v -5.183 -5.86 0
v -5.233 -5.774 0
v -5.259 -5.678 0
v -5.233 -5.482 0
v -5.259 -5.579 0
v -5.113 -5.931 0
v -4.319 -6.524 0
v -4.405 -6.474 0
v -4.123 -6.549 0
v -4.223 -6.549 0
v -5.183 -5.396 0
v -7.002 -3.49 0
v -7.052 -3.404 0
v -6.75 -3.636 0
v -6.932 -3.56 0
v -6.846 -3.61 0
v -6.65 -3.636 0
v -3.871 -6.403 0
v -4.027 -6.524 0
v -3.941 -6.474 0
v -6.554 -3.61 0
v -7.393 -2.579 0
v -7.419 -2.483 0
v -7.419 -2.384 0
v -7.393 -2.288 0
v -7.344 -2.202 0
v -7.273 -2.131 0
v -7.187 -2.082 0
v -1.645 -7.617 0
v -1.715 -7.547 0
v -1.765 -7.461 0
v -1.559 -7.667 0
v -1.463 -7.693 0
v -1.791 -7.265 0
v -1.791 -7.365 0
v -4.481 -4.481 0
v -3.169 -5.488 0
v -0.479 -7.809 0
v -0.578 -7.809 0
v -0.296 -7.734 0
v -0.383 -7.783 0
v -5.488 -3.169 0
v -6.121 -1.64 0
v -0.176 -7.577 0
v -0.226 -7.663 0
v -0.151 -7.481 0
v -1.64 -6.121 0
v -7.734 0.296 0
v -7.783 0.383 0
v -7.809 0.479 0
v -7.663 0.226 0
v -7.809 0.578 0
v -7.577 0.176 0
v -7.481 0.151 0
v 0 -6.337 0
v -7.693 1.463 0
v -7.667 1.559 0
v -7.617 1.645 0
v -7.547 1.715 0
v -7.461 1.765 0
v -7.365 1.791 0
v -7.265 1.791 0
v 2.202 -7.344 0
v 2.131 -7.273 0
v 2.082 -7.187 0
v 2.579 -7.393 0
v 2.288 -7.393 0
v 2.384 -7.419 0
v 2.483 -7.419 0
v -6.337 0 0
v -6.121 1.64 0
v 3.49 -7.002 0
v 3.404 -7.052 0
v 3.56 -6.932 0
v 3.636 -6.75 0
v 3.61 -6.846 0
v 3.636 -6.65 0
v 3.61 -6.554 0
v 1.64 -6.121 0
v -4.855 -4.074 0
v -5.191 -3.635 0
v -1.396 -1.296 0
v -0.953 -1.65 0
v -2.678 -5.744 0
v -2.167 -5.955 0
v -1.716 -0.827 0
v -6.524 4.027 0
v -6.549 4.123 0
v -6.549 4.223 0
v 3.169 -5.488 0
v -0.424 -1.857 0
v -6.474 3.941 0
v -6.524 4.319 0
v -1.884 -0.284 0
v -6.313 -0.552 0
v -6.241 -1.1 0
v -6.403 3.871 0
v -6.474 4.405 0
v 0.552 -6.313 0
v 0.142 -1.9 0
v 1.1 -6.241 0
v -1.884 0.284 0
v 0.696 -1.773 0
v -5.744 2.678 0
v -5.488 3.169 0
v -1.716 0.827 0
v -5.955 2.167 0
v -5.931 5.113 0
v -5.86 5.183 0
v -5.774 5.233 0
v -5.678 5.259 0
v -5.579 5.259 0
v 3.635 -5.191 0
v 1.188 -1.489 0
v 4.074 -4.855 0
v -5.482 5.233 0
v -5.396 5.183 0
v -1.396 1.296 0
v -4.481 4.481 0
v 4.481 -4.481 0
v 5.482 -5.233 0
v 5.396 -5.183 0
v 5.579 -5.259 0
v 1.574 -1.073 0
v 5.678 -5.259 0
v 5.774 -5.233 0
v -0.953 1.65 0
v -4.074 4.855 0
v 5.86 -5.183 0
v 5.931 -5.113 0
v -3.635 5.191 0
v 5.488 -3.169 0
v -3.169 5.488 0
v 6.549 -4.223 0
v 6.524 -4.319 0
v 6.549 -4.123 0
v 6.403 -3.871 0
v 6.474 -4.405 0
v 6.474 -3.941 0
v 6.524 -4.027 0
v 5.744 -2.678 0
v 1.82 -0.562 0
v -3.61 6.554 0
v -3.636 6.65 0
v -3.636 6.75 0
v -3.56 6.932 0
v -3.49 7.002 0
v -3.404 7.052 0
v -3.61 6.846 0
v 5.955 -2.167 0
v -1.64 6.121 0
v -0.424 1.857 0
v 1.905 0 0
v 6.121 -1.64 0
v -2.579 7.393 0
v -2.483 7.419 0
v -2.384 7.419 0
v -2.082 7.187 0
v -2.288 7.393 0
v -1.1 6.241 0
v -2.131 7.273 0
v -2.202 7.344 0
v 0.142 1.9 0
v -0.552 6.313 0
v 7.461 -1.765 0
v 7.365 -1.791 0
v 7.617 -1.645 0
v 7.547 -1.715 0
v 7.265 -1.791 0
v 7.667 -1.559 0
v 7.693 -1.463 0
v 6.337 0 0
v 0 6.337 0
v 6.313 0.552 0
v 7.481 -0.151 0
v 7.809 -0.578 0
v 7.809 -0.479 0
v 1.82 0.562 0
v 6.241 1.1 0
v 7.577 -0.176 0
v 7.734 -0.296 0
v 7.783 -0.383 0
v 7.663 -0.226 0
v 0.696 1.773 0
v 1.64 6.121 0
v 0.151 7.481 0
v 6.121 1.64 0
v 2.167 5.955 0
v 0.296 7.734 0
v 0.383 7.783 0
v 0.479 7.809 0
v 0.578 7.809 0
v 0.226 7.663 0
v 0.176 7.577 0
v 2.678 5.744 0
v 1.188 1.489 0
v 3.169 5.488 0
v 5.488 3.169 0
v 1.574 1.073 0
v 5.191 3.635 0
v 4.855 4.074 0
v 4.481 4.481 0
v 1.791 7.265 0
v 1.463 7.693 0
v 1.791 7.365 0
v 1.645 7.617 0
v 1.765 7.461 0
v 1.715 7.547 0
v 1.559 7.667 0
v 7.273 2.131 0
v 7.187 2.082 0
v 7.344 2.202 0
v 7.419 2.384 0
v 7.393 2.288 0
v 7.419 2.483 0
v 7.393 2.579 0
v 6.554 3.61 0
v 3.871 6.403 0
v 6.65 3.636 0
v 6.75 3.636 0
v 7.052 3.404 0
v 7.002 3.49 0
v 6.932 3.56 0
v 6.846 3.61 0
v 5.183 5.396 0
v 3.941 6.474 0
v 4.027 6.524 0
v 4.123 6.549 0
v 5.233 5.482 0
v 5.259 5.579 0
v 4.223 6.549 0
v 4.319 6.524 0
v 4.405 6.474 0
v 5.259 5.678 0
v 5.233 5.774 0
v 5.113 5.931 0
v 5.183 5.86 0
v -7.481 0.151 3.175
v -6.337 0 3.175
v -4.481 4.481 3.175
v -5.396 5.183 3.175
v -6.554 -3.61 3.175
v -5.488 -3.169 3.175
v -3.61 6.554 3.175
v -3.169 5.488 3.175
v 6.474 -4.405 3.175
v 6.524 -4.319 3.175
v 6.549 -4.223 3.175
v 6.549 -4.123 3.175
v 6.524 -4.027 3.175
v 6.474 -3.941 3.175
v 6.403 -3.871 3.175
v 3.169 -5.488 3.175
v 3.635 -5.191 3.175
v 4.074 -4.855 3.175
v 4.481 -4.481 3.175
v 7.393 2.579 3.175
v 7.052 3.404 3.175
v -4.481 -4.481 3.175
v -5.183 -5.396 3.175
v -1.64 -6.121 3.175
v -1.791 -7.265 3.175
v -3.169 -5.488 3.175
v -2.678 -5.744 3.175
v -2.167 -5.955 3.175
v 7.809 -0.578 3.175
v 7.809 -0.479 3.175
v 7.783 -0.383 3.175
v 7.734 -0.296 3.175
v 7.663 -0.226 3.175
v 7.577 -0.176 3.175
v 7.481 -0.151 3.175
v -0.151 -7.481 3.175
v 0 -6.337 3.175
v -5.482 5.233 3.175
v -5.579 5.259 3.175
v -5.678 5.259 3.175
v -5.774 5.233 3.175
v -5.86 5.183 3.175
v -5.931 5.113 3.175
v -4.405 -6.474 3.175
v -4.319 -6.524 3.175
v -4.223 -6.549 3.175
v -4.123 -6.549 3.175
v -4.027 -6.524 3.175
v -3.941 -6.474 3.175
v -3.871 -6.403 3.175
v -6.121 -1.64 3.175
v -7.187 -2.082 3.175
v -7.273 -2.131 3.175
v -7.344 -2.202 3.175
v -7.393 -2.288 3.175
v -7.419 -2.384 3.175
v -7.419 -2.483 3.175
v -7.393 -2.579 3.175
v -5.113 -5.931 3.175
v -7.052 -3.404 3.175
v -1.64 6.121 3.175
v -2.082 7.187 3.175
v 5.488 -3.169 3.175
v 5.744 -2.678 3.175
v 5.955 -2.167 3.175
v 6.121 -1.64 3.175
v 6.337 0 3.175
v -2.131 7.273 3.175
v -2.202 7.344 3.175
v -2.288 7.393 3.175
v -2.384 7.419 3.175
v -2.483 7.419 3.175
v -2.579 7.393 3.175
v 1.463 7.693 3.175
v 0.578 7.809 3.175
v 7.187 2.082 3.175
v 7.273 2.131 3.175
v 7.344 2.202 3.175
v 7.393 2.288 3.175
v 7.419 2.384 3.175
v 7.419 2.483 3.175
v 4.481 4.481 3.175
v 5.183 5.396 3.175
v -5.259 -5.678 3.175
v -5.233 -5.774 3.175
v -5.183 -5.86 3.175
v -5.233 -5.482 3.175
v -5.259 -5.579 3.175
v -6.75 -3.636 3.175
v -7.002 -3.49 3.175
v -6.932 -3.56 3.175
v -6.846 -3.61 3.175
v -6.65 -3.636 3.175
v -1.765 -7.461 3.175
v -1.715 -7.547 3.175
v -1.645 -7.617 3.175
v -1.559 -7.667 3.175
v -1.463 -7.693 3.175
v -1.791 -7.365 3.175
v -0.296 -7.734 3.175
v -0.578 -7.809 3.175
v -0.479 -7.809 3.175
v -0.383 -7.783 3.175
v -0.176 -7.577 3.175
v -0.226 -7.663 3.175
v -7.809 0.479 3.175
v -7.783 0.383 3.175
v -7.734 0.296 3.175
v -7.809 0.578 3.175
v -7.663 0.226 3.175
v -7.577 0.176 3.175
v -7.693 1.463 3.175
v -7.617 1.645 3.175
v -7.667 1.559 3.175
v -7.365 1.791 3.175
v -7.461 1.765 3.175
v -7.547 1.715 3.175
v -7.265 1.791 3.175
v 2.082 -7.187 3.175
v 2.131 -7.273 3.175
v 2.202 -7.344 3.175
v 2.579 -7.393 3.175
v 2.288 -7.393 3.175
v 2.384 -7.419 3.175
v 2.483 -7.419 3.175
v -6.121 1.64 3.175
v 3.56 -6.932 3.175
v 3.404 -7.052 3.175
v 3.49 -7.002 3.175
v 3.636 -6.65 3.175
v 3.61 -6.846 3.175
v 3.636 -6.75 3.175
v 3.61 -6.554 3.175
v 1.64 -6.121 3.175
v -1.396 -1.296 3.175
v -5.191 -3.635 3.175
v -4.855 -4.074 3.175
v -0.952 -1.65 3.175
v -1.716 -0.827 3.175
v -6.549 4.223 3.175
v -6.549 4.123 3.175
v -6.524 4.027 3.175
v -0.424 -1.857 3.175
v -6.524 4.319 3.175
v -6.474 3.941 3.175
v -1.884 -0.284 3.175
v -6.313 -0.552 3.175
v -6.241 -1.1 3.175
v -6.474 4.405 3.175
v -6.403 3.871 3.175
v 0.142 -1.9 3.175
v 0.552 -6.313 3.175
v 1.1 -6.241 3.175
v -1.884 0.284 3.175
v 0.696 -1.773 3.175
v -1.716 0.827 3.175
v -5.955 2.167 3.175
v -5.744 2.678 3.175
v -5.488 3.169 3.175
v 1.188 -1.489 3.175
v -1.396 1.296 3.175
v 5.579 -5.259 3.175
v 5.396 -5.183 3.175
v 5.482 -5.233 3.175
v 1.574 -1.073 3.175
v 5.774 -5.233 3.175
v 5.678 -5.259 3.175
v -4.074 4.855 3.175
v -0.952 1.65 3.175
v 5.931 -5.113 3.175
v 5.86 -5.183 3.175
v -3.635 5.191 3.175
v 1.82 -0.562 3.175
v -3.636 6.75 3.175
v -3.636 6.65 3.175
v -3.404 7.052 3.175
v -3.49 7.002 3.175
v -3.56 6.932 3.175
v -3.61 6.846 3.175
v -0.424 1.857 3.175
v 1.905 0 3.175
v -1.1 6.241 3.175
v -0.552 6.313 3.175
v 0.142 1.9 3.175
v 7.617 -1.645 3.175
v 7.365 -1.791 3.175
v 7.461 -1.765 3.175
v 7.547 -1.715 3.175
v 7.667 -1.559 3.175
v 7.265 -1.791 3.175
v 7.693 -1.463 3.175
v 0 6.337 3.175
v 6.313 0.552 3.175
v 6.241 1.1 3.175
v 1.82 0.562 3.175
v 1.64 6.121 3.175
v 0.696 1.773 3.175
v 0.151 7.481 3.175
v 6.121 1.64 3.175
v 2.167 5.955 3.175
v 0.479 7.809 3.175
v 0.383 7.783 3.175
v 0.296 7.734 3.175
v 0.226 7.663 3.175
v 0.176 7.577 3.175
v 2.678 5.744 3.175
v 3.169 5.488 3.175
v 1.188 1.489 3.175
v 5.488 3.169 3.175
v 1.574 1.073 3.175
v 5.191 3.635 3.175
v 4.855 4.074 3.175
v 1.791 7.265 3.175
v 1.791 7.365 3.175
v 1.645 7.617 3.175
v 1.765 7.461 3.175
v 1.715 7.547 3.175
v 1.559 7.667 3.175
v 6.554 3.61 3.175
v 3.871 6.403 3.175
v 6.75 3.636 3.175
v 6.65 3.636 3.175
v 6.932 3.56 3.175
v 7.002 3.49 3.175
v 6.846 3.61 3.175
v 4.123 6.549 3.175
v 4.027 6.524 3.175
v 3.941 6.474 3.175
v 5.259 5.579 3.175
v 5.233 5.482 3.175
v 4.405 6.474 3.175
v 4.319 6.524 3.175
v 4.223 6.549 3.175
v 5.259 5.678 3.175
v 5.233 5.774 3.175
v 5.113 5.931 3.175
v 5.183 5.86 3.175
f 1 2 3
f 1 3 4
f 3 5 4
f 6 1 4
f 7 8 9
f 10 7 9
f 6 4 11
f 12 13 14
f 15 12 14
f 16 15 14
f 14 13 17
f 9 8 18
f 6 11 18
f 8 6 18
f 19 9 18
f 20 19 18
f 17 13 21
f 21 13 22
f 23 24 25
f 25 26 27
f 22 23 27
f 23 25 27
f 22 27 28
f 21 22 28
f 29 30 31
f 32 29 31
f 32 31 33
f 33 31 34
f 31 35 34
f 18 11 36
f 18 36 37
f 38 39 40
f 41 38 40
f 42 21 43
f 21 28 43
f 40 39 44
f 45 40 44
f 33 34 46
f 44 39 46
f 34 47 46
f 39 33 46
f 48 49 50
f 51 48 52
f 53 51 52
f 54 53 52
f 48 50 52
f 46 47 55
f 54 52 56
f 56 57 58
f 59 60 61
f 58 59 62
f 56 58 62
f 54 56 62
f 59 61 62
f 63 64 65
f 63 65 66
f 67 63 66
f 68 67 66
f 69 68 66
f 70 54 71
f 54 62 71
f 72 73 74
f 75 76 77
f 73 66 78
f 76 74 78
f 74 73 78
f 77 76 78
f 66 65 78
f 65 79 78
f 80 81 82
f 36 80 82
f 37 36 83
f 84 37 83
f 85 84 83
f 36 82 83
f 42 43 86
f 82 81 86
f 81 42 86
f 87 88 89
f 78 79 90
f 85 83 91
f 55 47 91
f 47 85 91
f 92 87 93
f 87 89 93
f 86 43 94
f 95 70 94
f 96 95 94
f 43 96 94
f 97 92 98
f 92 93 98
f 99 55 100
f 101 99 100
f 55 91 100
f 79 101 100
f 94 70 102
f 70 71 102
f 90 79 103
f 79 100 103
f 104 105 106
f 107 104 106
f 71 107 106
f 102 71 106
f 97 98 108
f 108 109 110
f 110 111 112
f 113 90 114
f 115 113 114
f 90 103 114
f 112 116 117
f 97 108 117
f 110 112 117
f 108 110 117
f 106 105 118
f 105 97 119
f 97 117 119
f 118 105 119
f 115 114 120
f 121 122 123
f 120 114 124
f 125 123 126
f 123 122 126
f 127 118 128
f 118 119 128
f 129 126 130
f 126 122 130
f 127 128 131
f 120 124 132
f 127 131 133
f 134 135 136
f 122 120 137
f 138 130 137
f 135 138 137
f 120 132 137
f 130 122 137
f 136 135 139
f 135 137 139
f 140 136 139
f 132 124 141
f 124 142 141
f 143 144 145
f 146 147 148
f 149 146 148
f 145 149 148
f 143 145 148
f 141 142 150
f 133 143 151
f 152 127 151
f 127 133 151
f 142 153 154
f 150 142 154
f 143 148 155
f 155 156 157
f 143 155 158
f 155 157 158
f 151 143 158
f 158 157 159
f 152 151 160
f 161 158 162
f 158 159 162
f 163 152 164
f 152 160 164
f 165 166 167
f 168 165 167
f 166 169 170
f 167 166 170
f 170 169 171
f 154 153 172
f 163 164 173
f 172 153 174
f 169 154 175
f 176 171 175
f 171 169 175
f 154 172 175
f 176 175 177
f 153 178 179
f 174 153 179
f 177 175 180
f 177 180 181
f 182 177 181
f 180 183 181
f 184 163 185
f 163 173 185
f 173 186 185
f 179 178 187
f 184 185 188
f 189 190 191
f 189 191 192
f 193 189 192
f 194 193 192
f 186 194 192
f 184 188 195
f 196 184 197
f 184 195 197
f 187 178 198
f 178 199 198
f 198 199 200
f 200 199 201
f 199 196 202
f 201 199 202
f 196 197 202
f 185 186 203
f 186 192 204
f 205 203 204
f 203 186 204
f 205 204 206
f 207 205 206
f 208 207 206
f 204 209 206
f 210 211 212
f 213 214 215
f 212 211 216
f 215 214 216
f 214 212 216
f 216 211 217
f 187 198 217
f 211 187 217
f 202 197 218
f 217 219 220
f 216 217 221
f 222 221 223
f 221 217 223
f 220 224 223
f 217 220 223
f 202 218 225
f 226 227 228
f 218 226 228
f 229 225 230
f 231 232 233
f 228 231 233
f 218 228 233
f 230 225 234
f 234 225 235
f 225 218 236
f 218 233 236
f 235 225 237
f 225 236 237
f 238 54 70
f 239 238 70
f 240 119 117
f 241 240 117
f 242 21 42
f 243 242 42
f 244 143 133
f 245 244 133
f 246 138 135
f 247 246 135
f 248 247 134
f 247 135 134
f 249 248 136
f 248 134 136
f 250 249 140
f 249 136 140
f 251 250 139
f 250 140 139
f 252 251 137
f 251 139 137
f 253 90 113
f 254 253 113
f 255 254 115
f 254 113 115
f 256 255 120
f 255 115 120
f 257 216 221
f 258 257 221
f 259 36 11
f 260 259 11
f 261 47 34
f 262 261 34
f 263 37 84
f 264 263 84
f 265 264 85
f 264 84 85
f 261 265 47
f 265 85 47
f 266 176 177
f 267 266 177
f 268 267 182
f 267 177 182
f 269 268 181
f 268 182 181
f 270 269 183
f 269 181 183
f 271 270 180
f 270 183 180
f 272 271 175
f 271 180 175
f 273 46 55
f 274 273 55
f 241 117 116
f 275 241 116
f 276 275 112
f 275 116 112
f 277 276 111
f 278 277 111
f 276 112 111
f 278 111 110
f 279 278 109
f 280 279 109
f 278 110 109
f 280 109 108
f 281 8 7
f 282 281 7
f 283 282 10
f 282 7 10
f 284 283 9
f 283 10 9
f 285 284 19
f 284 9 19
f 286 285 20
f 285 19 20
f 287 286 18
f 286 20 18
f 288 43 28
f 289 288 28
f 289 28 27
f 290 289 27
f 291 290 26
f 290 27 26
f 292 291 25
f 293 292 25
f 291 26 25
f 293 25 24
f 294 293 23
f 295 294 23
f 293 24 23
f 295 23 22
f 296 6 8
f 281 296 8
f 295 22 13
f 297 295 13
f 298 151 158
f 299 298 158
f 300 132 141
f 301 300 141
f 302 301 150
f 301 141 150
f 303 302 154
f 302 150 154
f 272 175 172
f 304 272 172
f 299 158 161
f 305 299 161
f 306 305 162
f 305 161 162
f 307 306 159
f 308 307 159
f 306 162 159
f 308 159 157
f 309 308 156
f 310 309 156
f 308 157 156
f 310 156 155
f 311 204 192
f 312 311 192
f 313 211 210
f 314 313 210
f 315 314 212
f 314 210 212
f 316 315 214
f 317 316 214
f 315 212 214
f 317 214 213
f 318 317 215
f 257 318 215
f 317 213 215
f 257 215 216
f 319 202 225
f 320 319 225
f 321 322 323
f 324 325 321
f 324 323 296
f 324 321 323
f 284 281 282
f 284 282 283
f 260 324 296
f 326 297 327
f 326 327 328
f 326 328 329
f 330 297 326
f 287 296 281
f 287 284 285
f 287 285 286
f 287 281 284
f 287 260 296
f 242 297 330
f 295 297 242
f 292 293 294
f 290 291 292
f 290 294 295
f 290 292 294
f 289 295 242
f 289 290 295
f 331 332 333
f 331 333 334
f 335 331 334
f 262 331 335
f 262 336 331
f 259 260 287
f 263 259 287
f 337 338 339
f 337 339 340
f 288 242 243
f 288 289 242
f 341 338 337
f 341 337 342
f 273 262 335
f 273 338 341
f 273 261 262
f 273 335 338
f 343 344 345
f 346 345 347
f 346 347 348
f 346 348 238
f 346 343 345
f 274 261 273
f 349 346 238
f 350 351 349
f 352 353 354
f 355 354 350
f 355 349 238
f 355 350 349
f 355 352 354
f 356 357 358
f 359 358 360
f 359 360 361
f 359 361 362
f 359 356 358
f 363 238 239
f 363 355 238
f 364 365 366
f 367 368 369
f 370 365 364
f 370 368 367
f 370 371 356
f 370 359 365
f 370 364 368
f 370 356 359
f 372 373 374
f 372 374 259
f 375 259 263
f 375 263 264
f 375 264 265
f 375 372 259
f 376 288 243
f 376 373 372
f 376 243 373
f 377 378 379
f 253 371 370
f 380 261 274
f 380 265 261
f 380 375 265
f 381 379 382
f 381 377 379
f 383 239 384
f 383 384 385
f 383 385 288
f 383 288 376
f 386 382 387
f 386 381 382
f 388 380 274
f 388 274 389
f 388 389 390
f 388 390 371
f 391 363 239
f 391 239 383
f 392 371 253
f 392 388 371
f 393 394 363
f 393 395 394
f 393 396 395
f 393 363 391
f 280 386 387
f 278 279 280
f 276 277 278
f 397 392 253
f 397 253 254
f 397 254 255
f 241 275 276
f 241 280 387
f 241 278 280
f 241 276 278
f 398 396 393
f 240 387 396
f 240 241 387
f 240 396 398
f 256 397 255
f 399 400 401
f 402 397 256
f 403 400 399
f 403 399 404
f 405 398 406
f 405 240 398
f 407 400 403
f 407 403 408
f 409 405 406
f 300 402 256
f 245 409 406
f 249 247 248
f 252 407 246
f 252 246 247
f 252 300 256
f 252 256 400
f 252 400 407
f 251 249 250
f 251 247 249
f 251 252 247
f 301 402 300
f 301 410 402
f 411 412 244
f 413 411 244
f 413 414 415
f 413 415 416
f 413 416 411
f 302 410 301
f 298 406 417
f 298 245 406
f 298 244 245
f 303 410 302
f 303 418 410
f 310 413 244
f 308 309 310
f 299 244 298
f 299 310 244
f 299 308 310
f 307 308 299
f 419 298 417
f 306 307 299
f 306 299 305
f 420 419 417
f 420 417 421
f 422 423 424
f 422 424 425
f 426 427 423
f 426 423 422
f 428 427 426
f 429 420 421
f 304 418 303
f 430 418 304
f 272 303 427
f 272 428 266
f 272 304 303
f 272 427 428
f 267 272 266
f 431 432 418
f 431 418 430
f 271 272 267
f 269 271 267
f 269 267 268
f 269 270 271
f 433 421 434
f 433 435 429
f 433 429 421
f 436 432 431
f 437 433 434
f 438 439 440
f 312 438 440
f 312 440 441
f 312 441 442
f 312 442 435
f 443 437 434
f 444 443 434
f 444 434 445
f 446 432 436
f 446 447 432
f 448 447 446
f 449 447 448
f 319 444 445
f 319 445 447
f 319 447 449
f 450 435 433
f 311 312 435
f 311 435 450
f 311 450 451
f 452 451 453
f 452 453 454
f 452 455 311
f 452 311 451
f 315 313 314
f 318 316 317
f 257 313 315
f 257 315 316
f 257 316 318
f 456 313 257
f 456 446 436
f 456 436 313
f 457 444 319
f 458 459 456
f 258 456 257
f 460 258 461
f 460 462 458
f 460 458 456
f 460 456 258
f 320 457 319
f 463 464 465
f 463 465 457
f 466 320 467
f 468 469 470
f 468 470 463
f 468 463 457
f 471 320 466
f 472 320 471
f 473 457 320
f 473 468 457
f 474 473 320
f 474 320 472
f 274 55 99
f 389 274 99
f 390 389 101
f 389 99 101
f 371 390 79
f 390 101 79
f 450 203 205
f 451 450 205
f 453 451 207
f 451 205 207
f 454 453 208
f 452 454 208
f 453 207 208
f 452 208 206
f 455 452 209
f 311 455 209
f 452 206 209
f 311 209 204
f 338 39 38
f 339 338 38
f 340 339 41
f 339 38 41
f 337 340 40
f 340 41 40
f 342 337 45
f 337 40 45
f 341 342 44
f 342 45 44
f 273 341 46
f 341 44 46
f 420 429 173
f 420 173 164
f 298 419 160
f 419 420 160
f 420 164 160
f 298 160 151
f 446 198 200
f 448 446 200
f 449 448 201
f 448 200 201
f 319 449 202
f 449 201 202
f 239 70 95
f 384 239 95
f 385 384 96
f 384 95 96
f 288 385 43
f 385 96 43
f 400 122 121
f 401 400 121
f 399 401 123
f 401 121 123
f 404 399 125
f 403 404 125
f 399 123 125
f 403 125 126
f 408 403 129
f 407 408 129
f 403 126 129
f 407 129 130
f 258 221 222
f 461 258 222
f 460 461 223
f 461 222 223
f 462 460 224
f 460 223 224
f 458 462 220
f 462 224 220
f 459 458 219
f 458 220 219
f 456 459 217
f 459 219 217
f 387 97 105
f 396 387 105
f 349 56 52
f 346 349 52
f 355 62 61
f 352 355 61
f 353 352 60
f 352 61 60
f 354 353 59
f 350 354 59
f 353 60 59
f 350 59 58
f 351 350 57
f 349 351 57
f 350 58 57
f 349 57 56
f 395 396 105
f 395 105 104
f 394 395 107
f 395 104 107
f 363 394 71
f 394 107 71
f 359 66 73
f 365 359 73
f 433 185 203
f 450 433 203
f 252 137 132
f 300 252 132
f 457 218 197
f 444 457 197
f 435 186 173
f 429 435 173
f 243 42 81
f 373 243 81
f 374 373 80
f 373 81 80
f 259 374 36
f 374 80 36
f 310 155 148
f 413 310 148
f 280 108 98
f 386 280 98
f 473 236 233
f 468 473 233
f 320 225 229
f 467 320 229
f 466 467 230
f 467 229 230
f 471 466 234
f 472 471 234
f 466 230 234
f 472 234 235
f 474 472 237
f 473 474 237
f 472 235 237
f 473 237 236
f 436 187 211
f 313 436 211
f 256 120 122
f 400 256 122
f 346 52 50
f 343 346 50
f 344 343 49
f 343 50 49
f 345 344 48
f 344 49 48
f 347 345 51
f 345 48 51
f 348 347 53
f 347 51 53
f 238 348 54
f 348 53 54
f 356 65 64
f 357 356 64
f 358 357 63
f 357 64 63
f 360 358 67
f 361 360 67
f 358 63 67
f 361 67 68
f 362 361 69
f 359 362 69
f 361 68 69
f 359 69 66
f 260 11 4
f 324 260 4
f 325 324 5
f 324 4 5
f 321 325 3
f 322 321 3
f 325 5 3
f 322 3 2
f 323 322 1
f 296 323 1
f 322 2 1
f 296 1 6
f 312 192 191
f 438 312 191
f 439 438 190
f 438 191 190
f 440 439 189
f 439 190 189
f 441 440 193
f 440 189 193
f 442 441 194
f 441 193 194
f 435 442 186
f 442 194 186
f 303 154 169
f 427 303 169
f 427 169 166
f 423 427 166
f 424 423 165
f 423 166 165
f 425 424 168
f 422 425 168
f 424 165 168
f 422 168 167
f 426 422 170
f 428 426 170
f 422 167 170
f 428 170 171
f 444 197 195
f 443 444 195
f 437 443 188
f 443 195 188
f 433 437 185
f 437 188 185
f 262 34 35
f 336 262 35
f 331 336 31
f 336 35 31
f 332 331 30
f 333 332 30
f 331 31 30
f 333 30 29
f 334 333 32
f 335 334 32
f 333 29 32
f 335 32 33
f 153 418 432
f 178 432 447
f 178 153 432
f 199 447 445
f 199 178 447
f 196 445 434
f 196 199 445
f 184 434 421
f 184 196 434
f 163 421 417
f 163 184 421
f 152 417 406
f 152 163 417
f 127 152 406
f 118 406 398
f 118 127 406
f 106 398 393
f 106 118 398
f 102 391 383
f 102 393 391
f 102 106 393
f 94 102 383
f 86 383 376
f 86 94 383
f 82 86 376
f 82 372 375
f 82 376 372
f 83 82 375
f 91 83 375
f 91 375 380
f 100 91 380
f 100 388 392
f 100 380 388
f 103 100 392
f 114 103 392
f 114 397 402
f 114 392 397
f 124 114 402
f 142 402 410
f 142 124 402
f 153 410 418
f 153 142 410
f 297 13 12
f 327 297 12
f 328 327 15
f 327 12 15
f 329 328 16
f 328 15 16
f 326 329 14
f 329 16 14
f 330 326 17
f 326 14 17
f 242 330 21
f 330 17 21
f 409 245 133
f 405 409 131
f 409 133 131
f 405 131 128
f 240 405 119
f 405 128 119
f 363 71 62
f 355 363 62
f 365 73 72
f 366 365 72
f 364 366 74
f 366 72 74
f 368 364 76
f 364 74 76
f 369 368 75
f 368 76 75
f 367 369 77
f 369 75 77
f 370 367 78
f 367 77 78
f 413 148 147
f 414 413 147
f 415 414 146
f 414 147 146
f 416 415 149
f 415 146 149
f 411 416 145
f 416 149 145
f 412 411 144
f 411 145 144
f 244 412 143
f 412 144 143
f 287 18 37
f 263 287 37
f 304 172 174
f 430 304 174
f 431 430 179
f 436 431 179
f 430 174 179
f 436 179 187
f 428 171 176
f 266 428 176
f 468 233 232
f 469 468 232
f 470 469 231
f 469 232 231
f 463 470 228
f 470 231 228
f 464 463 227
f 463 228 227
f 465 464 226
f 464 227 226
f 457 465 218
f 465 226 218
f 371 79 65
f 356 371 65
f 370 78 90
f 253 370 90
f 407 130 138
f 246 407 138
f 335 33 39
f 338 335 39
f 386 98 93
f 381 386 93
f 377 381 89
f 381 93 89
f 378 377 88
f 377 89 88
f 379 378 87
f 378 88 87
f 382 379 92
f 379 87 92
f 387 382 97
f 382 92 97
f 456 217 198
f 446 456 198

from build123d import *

# Parameters (mm, degrees)
F0_R     = 1.905
F1_DEPTH = 3.175
F2_COUNT = 12


# Not quite as in the source:
# - a length typed as a fraction of an inch, garbled in the dataset ("3 / 203.2 mm" for 3/8 in), is restored


with BuildPart() as f1:
    # F0 (on Top) → F1 (new body)
    with BuildSketch(Plane.XY):
        with BuildLine():
            ThreePointArc((0, 6.3373), (-4.4811478044, -4.4811478044), (6.3373, 0))
            ThreePointArc((6.3373, 0), (5.0277181234, 3.8579038041), (1.6402139345, 6.1213617389))
            ThreePointArc((1.6402139345, 6.1213617389), (0.827183638, 6.28308352), (0, 6.3373))
        make_face()
        Circle(F0_R, mode=Mode.SUBTRACT)
        with BuildLine():
            ThreePointArc((0, 6.3373), (0.827183638, 6.28308352), (1.6402139345, 6.1213617389))
            Line((1.6402139345, 6.1213617389), (1.7907858552, 7.2650690248))
            ThreePointArc((1.7907858552, 7.2650690248), (1.7153129857, 7.5467376085), (1.4627758423, 7.6925399962))
            Line((1.4627758423, 7.6925399962), (0.5780428921, 7.8090172988))
            ThreePointArc((0.5780428921, 7.8090172988), (0.2963743084, 7.7335444293), (0.1505719207, 7.4810072858))
            Line((0.1505719207, 7.4810072858), (0, 6.3373))
        make_face()
    extrude(amount=F1_DEPTH)

    # F2: F1 ×12 about axis
    f2_axis = Axis((0, 0, 0), (0, 0, -1))


with BuildPart() as f1_1:
    add(f1.part)
    for i in range(1, F2_COUNT):
        add(f1.part.rotate(f2_axis, i * 360 / F2_COUNT))


solid = f1_1.part
